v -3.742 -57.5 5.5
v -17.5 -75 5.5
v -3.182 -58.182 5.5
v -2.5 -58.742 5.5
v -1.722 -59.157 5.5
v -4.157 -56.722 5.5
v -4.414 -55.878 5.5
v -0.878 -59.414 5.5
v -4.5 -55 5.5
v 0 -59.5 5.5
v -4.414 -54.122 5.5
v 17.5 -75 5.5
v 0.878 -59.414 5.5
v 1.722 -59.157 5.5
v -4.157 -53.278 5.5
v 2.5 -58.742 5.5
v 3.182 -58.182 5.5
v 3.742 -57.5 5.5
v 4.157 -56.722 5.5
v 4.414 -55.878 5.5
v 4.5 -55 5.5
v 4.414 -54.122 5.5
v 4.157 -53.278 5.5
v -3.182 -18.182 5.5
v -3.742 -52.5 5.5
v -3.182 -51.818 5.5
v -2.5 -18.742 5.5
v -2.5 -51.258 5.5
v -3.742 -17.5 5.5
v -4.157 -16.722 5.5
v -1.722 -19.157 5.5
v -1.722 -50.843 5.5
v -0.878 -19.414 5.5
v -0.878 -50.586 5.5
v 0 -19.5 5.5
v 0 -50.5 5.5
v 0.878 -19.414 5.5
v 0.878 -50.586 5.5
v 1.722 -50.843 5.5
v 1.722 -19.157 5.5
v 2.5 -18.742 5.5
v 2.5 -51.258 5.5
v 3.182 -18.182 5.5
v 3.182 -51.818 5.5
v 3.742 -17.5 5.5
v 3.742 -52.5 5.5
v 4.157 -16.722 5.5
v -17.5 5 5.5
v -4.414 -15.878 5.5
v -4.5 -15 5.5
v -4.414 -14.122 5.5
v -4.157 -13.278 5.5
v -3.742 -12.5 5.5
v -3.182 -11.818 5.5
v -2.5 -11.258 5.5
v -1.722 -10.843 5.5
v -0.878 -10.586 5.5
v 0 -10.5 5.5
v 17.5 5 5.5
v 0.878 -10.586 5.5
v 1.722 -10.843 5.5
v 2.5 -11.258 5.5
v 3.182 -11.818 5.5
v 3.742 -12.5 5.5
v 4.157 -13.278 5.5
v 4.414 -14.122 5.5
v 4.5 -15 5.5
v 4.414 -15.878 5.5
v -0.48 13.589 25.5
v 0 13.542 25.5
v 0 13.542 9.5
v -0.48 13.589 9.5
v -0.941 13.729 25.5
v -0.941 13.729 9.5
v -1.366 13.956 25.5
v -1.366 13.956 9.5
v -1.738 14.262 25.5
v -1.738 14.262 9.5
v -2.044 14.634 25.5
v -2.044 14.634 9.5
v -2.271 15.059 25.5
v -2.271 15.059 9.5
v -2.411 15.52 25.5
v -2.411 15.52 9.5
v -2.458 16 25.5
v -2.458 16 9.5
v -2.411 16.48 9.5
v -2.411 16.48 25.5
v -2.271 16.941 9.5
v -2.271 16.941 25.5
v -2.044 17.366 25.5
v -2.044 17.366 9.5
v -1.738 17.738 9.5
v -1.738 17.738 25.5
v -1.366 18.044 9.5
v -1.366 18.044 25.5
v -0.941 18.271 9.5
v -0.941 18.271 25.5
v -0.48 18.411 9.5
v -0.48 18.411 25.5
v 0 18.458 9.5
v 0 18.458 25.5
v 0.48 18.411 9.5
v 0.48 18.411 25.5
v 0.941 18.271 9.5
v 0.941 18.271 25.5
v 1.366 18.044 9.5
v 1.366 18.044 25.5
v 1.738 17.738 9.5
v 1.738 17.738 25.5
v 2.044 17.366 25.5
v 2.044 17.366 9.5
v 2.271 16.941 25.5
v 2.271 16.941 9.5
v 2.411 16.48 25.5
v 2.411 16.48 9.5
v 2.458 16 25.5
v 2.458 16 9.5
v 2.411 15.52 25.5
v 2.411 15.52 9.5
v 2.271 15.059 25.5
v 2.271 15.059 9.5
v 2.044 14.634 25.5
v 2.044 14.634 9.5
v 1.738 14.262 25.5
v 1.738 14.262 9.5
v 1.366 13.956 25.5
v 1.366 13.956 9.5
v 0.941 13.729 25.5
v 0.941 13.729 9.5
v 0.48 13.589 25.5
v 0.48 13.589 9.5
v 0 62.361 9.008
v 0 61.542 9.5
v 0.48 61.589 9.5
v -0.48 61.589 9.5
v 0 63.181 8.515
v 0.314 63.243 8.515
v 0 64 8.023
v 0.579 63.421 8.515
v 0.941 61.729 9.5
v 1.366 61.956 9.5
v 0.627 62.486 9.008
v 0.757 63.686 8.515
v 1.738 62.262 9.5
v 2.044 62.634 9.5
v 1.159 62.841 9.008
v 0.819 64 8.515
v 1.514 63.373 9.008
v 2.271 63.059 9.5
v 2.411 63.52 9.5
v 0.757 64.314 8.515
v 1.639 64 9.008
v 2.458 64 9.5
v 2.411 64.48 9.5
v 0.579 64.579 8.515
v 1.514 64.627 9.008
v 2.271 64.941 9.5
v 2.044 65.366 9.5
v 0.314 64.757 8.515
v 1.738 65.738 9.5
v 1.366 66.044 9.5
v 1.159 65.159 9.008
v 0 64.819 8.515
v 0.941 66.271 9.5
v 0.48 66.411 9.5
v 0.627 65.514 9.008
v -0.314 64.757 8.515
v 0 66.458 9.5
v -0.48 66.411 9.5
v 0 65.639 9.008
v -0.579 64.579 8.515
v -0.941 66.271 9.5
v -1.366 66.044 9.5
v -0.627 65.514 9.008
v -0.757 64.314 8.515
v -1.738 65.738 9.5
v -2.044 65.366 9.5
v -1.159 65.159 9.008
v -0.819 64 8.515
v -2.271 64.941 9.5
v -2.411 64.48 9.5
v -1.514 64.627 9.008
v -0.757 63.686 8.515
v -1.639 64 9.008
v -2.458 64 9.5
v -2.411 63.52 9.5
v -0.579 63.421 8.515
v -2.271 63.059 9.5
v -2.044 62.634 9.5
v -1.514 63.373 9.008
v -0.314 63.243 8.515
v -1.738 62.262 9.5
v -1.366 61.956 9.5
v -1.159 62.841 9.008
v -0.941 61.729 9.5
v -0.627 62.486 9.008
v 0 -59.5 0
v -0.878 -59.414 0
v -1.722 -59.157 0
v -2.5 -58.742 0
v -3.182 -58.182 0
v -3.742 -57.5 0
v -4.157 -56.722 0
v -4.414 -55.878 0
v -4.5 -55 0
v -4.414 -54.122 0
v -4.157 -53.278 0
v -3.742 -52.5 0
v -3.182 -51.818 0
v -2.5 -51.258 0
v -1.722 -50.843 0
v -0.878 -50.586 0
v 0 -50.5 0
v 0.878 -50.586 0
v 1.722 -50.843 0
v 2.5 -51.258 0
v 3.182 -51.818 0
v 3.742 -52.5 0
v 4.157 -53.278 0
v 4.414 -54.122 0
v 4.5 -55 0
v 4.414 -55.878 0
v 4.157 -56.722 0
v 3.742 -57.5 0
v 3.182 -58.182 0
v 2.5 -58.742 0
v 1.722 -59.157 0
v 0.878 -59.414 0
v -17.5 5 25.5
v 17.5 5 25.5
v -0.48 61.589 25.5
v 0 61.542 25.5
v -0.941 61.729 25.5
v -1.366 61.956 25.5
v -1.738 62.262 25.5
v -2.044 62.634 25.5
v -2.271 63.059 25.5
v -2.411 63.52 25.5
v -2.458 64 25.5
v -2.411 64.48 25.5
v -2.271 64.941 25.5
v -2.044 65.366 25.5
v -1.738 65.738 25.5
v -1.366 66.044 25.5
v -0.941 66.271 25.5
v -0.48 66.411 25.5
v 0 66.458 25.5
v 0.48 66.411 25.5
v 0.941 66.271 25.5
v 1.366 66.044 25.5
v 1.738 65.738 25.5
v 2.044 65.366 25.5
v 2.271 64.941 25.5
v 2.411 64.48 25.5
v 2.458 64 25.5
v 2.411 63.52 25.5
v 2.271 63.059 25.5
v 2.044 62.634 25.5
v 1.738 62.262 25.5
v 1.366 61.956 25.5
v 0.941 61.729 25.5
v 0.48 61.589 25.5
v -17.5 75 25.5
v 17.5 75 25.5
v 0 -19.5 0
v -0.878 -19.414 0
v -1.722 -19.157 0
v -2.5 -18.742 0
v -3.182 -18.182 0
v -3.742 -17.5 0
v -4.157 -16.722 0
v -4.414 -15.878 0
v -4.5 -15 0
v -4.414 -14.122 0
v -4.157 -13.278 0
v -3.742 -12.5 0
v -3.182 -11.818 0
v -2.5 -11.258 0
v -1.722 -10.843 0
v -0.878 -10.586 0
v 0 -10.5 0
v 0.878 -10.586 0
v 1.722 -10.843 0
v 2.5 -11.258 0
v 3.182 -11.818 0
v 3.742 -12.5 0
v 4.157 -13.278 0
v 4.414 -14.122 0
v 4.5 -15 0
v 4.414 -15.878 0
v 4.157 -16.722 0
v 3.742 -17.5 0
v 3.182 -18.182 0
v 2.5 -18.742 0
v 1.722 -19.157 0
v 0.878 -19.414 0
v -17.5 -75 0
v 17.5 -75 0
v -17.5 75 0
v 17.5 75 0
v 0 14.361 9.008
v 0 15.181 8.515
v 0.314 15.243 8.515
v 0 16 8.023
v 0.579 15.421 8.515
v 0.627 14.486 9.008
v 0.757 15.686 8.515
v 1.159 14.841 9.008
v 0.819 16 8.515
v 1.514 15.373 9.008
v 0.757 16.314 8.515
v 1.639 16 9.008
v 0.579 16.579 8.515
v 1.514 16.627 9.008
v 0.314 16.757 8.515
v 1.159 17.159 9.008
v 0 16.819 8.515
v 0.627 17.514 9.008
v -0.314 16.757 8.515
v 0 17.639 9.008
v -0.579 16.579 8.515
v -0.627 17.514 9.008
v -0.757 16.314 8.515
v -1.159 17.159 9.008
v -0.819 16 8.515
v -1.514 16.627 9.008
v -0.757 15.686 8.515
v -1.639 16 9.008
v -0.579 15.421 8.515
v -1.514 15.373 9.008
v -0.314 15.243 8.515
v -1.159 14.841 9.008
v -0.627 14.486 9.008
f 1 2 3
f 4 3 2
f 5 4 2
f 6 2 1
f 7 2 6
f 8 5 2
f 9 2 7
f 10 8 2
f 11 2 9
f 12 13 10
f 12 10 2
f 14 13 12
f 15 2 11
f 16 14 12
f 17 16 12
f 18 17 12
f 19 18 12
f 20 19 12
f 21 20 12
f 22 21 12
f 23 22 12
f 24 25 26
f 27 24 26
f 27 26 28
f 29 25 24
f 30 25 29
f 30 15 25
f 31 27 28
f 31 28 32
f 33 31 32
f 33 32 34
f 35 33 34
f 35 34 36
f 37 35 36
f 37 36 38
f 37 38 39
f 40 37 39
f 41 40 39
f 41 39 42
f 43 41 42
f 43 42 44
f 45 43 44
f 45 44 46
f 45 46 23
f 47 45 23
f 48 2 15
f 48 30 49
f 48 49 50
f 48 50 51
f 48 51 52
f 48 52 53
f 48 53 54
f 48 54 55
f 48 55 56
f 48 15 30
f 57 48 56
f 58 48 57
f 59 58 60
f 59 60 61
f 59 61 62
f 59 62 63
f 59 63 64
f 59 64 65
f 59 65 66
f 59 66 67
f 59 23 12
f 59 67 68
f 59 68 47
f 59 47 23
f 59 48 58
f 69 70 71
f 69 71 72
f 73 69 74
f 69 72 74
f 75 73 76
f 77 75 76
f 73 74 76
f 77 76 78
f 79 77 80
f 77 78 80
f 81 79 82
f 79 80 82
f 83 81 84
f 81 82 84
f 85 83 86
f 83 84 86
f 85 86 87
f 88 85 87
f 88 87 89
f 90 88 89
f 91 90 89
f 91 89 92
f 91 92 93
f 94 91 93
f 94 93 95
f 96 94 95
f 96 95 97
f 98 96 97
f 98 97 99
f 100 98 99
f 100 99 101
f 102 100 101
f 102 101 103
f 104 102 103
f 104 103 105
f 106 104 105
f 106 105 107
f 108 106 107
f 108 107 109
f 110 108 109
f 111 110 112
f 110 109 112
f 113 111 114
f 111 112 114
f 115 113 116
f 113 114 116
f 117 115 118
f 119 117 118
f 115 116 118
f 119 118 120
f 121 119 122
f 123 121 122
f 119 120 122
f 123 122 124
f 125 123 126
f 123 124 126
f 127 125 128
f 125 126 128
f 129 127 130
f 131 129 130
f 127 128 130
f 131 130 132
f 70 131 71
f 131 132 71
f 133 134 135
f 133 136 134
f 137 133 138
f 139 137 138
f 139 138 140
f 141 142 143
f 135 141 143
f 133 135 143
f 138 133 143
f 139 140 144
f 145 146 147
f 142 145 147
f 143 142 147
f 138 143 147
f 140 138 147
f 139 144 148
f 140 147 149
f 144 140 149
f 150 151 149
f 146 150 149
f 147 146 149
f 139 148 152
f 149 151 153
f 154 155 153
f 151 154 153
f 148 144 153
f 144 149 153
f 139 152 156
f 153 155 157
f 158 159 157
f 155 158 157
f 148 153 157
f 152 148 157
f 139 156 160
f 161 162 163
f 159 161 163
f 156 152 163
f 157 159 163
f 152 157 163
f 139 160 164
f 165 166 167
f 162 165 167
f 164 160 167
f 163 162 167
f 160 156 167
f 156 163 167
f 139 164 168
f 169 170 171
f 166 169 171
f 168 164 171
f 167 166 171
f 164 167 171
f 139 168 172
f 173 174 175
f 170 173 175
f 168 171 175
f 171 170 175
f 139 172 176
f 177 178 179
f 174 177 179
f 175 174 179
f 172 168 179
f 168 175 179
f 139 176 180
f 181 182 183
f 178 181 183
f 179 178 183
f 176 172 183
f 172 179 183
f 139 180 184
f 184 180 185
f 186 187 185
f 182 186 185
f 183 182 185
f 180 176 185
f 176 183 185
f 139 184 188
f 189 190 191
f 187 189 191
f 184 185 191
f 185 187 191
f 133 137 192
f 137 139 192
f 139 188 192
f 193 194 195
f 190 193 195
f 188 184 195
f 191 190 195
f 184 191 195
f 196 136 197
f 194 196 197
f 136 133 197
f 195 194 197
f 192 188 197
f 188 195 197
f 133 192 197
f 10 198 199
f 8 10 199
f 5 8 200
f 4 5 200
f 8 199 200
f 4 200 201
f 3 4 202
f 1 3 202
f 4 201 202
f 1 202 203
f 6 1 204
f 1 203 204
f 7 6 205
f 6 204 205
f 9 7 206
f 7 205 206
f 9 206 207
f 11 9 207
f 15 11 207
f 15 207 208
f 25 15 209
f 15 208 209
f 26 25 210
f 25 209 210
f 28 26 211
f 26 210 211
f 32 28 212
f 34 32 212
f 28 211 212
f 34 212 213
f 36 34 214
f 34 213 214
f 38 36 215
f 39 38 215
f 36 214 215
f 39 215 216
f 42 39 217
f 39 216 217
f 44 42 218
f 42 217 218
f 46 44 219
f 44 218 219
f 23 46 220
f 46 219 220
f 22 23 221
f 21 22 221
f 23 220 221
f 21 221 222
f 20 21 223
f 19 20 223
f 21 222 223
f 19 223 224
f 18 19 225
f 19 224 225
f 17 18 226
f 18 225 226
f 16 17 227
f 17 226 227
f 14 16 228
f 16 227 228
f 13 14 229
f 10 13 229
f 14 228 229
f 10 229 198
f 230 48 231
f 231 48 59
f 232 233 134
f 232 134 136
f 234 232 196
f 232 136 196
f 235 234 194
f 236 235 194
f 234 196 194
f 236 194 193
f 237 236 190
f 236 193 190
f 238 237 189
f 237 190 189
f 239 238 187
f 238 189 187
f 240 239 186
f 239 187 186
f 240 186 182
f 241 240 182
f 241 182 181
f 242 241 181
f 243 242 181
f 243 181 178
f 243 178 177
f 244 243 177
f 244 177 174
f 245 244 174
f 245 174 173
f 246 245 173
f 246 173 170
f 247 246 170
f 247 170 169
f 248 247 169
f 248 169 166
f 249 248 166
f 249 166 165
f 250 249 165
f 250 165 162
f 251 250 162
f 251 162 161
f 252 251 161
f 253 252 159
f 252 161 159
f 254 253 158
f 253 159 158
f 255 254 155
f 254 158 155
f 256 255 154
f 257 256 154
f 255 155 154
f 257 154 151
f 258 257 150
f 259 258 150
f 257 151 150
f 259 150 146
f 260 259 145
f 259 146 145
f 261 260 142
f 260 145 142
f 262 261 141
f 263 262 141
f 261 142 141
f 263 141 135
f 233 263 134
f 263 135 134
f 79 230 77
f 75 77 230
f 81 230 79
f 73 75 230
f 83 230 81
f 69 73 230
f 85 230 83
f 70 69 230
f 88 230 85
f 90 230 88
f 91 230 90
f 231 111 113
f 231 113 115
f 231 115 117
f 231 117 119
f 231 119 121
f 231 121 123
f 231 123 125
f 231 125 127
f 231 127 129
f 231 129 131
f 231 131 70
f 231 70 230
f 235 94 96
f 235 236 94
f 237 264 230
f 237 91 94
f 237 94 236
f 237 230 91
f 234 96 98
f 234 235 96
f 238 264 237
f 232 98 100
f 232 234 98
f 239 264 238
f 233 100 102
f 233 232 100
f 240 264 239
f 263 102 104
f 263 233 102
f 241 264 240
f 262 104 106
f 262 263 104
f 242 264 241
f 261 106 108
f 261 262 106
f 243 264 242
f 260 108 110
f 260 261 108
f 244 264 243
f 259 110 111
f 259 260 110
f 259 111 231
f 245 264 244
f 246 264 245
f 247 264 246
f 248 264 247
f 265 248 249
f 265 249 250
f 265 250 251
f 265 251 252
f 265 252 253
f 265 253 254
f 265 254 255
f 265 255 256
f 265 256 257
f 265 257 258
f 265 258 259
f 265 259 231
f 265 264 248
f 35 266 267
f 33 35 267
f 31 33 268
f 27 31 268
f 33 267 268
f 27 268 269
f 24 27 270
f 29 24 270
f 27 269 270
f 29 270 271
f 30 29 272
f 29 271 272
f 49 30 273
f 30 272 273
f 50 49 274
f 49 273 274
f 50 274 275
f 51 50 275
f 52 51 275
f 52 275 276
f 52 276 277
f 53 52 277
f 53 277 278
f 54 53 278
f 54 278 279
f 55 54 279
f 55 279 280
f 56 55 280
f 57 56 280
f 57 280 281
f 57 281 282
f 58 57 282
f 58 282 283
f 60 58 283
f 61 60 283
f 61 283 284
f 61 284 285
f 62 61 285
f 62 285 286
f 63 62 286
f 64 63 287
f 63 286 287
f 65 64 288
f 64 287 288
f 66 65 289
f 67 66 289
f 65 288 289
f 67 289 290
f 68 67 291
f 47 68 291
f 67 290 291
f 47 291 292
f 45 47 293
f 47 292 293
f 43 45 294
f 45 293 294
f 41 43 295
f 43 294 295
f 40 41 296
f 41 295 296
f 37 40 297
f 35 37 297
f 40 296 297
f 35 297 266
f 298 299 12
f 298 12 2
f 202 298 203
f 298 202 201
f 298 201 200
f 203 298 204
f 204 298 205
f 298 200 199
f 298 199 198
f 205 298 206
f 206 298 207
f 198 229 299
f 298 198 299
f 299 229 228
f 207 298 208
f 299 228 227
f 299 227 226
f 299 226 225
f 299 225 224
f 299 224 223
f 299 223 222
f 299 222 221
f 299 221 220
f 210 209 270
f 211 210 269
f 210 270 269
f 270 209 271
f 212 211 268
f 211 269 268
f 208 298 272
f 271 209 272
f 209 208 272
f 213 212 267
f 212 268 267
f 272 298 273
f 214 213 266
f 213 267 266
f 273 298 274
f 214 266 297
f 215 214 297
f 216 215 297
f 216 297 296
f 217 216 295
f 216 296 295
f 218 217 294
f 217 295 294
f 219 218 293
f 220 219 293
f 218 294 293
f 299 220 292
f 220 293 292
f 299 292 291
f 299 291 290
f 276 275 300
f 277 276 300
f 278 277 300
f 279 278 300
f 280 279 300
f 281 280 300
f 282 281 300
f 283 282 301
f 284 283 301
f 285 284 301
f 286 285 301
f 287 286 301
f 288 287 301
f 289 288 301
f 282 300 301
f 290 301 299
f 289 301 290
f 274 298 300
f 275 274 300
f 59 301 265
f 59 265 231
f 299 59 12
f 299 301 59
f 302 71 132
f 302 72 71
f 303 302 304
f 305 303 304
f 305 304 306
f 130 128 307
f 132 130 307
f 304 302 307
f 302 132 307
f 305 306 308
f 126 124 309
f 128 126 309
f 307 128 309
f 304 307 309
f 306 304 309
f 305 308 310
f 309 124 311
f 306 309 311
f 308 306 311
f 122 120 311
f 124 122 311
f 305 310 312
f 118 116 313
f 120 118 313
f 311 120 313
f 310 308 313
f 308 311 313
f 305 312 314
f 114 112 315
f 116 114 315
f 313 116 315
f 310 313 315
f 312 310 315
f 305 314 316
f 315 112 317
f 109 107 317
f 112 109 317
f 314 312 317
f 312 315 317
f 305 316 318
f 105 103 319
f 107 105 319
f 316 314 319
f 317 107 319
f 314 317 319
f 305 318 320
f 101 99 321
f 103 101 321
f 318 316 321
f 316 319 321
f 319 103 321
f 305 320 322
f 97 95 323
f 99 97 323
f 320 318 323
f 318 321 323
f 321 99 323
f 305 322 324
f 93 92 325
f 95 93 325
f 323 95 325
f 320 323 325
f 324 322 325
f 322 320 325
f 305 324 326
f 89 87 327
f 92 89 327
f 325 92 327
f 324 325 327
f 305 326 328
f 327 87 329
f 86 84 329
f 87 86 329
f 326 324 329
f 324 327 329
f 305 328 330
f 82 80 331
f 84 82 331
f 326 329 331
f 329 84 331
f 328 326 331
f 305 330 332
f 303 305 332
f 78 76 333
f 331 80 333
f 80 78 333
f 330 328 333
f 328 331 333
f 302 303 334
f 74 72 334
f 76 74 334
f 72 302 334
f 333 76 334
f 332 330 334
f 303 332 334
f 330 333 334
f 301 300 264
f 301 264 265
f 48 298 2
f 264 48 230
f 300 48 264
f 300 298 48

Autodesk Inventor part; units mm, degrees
ref_plane "YZ Plane" through (0, 0, 0) normal (1, 0, 0) x (0, 1, 0)
sketch "Skizze1" plane through (0, 0, 0) normal (0, 0, 1) x (1, 0, 0)
  line L0 (-17.5, 75) -> (17.5, 75)
  line L1 (17.5, 75) -> (17.5, -75)
  line L2 (17.5, -75) -> (-17.5, -75)
  line L3 (-17.5, -75) -> (-17.5, 75)
  line L4 (-17.5, 75) -> (17.5, -75) construction
  line L5 (17.5, 75) -> (-17.5, -75) construction
  point P0 (0, 0)
  dimension "d0" = 35
  dimension "d1" = 150
extrude "Extrusion1" add sketch "Skizze1" along normal blind 5.5
sketch "Skizze3" plane through (0, 0, 5.5) normal (0, 0, 1) x (1, 0, 0)
  line L0 (-17.5, 5) -> (17.5, 5)
  line L1 (17.5, 5) -> (17.5, 75)
  line L2 (17.5, 75) -> (-17.5, 75)
  line L3 (-17.5, 75) -> (-17.5, 5)
  line L4 (-17.5, 5) -> (17.5, 75) construction
  line L5 (17.5, 5) -> (-17.5, 75) construction
  line L6 (-17.5, 75) -> (-17.5, -75) projected
  line L7 (17.5, 75) -> (-17.5, 75) projected
  line L8 (17.5, -75) -> (17.5, 75) projected
  point P0 (0, 40)
  point P1 (-4.35, 75)
  point P2 (-17.5, 40)
  dimension "d8" = 70
extrude "Extrusion3" add sketch "Skizze3" along normal blind 20
ref_plane "Arbeitsebene2" through (-17.5, 40, 5.5) normal (0, -1, 0) x (1, 0, 0)
sketch "Skizze5" plane through (0, 0, 25.5) normal (0, 0, 1) x (1, 0, 0)
  line L0 (24.5, 40) -> (-24.5, 40) projected
  line L1 (0, 105) -> (0, -105) projected
  point P0 (0, 0)
  point P1 (0, 16)
  point P2 (0, 64)
  dimension "d23" = 24
  dimension "d24" = 24
hole "Bohrung2" at (0, 16, 25.5) at (0, 64, 25.5) direction (0, 0, -1) diameter 4.917 depth 16 tip angle 118 thread size "M6x1" class "6H" standard "ISO Metric profile"
ref_plane "Arbeitsebene3" through (-17.5, -27.5, 0) normal (0, -1, 0) x (1, 0, 0)
sketch "Skizze6" plane through (0, 0, 5.5) normal (0, 0, 1) x (1, 0, 0)
  line L0 (0, 105) -> (0, -105) projected
  line L1 (-17.5, -75) -> (17.5, -75) projected
  point P0 (0, 0)
  point P1 (0, -55)
  point P2 (0, -15)
  dimension "d36" = 20
  dimension "d37" = 60
hole "Bohrung3" at (0, -55, 5.5) at (0, -15, 5.5) direction (0, 0, -1) diameter 9 end through all clearance for "Flachkopfsenkschraube DIN EN ISO 2009" size "M8" standard "DIN"
properties part number "Adapterplatte_Vibrationsdaempfer"
